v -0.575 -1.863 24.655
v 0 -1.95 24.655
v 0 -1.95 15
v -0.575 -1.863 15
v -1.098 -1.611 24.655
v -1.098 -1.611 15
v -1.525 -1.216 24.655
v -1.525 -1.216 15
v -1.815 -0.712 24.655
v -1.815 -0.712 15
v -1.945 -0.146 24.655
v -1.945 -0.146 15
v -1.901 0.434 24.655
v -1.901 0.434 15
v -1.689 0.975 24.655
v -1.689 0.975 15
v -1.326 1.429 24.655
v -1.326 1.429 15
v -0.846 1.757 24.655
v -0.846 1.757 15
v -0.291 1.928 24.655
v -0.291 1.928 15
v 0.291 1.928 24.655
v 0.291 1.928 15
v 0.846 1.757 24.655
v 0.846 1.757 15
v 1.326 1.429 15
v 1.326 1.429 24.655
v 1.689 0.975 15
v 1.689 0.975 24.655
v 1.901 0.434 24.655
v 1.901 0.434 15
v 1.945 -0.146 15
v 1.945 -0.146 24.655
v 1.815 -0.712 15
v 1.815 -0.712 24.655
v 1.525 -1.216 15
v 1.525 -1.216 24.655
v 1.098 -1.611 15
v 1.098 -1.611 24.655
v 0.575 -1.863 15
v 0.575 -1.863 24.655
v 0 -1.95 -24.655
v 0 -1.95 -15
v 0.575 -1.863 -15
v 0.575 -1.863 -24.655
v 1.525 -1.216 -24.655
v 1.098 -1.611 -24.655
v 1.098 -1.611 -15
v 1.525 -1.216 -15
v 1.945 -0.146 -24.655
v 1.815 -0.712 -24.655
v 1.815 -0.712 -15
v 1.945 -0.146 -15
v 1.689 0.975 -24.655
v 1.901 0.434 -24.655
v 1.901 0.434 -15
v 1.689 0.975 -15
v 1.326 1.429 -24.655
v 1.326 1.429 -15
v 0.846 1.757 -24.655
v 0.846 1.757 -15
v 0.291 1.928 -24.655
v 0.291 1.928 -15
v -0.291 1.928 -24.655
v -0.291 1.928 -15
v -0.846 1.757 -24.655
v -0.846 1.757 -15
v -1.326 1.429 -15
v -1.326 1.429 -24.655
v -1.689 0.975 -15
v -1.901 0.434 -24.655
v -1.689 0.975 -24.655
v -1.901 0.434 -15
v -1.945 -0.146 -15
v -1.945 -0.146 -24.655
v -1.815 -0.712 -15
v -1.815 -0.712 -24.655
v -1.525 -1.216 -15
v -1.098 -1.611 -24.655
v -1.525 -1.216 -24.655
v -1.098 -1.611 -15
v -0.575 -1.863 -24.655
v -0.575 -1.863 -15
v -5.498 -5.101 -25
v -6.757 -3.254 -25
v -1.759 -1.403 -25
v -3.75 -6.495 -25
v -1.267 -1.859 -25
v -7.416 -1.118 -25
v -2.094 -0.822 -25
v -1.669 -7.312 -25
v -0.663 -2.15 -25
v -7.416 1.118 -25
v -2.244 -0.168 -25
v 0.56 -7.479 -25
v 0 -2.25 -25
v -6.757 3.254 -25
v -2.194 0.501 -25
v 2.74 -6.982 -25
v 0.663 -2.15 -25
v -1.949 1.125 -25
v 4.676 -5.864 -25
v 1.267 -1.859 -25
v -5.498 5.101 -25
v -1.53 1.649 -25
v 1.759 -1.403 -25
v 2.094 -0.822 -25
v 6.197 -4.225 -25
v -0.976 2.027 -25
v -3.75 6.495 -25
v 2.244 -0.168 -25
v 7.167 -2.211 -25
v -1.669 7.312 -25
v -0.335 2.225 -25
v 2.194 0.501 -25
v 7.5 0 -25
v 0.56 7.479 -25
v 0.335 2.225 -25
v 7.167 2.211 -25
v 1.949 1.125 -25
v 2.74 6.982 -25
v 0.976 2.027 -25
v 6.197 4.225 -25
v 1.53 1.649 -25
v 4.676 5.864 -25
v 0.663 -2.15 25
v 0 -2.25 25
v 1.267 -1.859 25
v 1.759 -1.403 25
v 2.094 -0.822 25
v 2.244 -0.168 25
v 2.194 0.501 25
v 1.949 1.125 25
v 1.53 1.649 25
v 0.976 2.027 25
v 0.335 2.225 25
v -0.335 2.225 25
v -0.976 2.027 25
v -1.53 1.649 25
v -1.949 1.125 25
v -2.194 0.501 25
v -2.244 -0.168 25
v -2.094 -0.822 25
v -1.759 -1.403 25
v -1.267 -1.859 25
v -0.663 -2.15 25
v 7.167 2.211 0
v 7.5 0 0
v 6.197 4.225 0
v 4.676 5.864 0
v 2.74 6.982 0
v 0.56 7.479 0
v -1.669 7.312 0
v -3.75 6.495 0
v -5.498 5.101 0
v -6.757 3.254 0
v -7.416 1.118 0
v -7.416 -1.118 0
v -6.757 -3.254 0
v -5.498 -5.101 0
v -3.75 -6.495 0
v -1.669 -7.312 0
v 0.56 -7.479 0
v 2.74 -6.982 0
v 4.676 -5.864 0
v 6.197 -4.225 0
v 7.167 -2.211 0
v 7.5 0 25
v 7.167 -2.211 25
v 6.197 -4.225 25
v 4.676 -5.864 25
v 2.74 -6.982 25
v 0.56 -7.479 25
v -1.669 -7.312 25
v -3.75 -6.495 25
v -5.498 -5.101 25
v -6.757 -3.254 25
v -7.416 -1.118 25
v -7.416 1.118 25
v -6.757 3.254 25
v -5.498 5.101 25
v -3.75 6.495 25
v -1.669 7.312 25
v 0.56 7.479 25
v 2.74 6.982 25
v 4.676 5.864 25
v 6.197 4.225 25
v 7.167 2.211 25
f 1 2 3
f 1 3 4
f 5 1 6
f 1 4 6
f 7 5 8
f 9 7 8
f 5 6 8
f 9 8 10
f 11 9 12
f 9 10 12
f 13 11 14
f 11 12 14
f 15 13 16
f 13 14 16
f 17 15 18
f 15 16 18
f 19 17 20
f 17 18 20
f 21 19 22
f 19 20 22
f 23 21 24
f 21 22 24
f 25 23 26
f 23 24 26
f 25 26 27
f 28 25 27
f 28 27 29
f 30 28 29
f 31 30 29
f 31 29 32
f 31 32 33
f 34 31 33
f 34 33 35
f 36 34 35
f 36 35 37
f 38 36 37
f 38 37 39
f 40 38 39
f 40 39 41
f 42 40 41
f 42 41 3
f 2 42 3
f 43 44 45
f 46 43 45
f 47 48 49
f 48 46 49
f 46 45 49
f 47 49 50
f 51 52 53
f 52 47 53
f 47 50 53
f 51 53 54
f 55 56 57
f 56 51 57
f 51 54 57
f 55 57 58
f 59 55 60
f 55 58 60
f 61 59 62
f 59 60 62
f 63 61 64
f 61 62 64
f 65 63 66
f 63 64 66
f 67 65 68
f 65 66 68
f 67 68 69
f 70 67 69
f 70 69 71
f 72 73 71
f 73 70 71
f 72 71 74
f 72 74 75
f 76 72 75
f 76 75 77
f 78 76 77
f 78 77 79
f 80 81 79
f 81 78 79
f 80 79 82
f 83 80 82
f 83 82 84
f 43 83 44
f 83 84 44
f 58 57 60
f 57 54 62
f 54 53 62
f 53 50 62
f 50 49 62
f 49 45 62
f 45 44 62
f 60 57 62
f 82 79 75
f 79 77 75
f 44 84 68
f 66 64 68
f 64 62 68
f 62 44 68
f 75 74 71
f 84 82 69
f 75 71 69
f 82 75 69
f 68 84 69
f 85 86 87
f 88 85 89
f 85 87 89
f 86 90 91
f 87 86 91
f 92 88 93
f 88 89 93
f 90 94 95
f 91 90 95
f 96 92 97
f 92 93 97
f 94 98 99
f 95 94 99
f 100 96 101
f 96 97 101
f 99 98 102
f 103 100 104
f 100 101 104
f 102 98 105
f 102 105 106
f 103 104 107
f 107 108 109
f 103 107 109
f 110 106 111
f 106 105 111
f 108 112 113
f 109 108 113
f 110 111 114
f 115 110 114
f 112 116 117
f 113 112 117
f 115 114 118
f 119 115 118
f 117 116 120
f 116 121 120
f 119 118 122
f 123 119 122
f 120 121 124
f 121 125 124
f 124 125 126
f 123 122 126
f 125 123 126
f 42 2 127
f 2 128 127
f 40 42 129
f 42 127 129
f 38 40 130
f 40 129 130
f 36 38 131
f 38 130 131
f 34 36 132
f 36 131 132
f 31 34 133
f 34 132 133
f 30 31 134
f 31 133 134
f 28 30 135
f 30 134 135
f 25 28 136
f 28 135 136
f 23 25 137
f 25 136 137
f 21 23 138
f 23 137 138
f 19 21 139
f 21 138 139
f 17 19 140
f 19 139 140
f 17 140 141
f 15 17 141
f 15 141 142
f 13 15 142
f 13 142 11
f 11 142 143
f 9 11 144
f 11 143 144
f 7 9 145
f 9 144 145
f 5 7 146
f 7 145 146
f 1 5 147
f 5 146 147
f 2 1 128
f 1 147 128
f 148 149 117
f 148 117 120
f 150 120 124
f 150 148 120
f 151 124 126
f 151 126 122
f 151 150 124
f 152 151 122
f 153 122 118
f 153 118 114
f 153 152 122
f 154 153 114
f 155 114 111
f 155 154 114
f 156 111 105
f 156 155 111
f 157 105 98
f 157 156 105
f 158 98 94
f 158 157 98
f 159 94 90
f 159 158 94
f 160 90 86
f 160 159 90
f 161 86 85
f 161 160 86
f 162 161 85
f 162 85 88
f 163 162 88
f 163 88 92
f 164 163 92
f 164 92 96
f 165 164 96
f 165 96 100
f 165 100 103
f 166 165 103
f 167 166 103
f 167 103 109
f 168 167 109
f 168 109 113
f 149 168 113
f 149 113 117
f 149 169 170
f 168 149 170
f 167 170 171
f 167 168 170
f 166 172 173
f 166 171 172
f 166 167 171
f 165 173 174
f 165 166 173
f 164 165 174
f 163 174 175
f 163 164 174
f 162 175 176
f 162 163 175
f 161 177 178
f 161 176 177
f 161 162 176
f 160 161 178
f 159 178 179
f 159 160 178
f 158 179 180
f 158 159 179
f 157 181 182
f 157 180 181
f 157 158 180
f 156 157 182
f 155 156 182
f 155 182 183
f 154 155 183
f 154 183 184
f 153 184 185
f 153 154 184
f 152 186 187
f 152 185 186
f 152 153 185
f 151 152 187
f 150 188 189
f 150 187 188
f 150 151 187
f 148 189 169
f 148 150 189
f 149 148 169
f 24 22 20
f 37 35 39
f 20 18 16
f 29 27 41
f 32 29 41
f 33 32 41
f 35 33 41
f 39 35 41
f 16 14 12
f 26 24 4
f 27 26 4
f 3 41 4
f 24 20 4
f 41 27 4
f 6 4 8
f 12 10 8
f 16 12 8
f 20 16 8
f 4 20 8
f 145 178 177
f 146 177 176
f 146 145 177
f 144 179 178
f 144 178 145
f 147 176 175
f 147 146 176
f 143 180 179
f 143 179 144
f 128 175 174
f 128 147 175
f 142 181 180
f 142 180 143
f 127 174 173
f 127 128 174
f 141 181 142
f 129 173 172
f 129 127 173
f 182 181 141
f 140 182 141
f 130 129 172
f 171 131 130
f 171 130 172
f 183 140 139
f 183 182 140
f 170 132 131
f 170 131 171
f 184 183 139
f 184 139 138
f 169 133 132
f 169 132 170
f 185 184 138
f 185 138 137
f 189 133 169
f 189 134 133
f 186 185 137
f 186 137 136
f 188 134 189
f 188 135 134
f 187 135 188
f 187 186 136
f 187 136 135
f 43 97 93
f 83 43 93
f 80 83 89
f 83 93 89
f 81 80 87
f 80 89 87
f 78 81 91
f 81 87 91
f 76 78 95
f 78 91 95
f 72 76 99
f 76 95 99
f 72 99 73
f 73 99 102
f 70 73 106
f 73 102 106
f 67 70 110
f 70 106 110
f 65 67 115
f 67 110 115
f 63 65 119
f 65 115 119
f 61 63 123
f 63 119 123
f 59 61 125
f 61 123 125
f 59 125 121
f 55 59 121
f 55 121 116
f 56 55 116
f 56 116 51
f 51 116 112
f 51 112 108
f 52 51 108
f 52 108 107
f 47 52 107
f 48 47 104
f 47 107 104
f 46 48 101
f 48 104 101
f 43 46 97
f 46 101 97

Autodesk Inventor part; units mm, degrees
ref_plane "YZ Plane" through (0, 0, 0) normal (1, 0, 0) x (0, 1, 0)
ref_plane "XZ Plane" through (0, 0, 0) normal (0, 1, 0) x (-1, 0, 0)
ref_plane "XY Plane" through (0, 0, 0) normal (0, 0, 1) x (1, 0, 0)
sketch "Эскиз1" plane through (0, 0, 0) normal (0, 0, 1) x (1, 0, 0)
  circle A0 centre (0, 0) radius 7.5
  dimension "d0" = 15
extrude "Выдавливание1" add sketch "Эскиз1" along normal mid plane 50
sketch "Эскиз2" plane through (0, 0, 25) normal (0, 0, 1) x (1, 0, 0)
  point P0 (0, 0)
hole "Отверстие1" at (0, 0, 25) direction (0, 0, -1) diameter 3.9 depth 10 countersink diameter 4.5 countersink angle 82
mirror "Зеркальное отражение1" about plane through (0, 0, 0) normal (0, 0, 1) of "Отверстие1"
properties part number "Стойка" material "По умолчанию1"
